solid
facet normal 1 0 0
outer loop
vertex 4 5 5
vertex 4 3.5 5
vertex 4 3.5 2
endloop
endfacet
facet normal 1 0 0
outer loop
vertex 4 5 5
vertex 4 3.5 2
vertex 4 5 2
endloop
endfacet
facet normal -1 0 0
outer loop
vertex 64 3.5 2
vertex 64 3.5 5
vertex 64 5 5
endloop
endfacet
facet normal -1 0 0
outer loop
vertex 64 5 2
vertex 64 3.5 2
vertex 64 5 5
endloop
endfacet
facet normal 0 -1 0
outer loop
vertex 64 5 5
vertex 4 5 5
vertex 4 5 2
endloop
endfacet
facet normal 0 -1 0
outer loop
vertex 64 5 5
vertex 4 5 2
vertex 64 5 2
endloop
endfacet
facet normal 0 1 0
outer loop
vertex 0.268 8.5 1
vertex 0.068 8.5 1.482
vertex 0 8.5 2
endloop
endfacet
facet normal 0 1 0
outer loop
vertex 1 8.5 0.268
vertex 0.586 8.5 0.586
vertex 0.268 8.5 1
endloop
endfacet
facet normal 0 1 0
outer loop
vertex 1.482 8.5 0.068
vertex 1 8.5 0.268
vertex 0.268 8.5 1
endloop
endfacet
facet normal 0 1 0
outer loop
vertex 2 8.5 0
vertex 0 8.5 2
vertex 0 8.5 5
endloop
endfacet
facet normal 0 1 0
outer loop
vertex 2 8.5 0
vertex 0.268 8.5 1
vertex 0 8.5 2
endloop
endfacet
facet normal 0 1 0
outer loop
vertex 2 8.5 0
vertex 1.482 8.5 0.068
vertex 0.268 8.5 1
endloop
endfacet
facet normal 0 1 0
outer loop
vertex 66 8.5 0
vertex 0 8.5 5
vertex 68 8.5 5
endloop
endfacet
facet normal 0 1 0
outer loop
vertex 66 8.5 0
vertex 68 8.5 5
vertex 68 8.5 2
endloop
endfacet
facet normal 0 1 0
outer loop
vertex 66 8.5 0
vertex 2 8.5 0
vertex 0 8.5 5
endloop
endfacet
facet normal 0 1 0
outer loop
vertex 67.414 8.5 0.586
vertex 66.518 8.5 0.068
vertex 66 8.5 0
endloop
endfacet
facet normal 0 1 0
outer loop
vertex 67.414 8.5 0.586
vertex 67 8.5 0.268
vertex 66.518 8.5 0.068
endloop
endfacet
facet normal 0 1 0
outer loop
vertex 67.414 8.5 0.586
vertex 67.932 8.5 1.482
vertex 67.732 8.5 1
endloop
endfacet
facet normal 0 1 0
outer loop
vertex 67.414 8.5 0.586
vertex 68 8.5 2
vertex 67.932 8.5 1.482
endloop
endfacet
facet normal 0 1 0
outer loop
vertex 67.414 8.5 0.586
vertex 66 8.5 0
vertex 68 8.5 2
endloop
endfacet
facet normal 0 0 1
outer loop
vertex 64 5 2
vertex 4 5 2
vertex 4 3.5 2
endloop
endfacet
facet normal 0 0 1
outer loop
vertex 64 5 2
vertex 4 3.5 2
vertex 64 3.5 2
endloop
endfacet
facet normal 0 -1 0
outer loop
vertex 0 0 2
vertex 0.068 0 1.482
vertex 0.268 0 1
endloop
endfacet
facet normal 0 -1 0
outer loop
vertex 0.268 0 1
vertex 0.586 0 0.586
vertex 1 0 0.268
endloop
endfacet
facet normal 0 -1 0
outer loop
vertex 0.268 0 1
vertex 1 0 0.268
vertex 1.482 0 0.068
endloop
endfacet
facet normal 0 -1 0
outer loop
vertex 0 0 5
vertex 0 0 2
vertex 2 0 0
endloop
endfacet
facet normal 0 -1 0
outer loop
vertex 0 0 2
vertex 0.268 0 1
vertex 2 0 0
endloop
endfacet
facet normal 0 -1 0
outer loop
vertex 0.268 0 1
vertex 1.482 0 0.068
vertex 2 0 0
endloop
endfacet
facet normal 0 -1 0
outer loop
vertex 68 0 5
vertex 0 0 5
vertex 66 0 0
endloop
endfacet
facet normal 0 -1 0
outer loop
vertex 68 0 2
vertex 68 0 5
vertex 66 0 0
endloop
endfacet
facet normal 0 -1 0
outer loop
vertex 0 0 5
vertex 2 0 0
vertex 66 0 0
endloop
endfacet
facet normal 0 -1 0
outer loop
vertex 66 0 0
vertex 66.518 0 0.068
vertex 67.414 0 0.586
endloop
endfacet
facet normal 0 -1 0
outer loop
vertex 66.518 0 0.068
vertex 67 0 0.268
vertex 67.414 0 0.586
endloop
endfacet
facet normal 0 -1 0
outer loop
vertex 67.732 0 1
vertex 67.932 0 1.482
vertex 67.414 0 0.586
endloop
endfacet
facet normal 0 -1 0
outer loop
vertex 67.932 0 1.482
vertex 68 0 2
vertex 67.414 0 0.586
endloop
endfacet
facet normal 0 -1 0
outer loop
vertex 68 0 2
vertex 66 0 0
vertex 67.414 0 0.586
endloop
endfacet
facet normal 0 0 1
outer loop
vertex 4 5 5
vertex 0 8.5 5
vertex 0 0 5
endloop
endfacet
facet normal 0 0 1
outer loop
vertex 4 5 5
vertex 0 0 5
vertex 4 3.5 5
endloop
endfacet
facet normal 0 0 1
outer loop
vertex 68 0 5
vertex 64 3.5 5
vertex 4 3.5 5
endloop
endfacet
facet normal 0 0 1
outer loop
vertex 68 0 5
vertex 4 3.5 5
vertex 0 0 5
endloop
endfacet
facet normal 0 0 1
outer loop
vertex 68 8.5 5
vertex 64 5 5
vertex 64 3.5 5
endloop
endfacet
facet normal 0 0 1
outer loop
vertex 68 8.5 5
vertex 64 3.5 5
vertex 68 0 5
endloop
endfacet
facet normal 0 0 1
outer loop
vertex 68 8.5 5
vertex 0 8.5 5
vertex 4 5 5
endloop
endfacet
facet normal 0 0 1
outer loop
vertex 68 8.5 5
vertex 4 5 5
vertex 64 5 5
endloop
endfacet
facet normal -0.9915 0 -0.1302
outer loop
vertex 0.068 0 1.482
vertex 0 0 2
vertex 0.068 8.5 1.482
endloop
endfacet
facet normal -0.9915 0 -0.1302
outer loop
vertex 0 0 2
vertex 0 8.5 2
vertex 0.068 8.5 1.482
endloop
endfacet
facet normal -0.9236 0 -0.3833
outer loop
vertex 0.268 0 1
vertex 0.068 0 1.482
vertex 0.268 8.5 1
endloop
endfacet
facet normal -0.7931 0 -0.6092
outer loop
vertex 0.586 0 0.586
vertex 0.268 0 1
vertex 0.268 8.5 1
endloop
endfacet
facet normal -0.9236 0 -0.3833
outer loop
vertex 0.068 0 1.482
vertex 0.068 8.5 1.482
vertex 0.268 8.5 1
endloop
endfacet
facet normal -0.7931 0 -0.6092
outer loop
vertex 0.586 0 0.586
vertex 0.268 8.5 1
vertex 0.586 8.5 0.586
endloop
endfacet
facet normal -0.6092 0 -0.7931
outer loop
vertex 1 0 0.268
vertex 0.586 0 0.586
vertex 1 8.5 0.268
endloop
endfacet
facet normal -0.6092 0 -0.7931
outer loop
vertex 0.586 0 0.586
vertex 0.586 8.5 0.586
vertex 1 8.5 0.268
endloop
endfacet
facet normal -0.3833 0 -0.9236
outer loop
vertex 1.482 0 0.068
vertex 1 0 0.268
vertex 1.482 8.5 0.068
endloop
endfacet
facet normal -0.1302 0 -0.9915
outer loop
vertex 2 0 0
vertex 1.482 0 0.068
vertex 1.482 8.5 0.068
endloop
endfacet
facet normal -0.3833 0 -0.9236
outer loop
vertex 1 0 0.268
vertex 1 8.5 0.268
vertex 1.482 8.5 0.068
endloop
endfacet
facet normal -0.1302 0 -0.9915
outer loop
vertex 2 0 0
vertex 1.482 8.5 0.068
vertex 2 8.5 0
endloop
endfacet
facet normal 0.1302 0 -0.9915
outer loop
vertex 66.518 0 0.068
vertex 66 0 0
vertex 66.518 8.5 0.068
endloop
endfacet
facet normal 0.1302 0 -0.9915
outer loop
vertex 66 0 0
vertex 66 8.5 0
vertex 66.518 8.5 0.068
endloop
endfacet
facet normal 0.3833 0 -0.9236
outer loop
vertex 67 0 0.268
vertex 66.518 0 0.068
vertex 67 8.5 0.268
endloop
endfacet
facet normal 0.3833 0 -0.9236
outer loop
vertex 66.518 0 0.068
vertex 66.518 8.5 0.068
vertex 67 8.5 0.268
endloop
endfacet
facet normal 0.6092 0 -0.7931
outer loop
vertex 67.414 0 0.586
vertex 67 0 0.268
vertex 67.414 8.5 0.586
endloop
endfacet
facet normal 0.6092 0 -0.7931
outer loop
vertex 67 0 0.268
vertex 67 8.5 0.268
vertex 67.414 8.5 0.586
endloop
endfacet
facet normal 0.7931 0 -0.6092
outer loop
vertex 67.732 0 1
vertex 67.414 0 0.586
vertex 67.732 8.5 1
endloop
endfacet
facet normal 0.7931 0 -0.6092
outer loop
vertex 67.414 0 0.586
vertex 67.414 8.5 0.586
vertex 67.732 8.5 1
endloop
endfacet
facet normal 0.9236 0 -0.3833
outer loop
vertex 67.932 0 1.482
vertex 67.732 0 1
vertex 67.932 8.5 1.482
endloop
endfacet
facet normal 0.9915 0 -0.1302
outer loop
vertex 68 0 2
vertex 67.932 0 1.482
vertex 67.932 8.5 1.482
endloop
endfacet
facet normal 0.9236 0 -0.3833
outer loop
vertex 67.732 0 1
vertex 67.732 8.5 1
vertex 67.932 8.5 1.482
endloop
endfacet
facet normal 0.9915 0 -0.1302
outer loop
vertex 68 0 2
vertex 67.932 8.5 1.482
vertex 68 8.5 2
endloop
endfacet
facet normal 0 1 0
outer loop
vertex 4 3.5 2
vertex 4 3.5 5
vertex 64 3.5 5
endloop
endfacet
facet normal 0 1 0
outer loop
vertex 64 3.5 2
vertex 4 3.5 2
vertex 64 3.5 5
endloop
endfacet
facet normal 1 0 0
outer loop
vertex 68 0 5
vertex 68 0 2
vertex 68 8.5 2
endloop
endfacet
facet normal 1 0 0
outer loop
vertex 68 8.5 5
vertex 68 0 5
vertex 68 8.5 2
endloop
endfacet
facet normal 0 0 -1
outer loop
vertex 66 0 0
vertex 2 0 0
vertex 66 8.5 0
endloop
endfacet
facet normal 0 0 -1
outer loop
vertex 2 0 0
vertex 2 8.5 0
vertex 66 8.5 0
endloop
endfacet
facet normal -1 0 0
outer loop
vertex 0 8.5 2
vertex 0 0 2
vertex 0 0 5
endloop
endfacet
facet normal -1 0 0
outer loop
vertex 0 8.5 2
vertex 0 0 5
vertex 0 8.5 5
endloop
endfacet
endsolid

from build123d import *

# Parameters (mm, degrees)
SKETCH1_W           = 68
SKETCH1_H           = 8.5
BOSS_EXTRUDE1_DEPTH = 5
SKETCH2_W           = 60
SKETCH2_H           = 1.5
CUT_EXTRUDE1_DEPTH  = 3
FILLET1_R           = 2


with BuildPart() as part:
    # Sketch1 → Boss-Extrude1 (new body)
    with BuildSketch(Plane.XY):
        with Locations((34, 4.25)):
            Rectangle(SKETCH1_W, SKETCH1_H)
    extrude(amount=BOSS_EXTRUDE1_DEPTH)

    # Sketch2 → Cut-Extrude1 (cut)
    with BuildSketch(Plane.XY.offset(5)):
        with Locations((34, 4.25)):
            Rectangle(SKETCH2_W, SKETCH2_H)
    extrude(amount=-CUT_EXTRUDE1_DEPTH, mode=Mode.SUBTRACT)

    # Fillet1
    fillet1_edges = [part.edges().sort_by_distance(p)[0] for p in [
        (68, 4.25, 0),
        (0, 4.25, 0),
    ]]
    fillet(fillet1_edges, radius=FILLET1_R)


solid = part.part
